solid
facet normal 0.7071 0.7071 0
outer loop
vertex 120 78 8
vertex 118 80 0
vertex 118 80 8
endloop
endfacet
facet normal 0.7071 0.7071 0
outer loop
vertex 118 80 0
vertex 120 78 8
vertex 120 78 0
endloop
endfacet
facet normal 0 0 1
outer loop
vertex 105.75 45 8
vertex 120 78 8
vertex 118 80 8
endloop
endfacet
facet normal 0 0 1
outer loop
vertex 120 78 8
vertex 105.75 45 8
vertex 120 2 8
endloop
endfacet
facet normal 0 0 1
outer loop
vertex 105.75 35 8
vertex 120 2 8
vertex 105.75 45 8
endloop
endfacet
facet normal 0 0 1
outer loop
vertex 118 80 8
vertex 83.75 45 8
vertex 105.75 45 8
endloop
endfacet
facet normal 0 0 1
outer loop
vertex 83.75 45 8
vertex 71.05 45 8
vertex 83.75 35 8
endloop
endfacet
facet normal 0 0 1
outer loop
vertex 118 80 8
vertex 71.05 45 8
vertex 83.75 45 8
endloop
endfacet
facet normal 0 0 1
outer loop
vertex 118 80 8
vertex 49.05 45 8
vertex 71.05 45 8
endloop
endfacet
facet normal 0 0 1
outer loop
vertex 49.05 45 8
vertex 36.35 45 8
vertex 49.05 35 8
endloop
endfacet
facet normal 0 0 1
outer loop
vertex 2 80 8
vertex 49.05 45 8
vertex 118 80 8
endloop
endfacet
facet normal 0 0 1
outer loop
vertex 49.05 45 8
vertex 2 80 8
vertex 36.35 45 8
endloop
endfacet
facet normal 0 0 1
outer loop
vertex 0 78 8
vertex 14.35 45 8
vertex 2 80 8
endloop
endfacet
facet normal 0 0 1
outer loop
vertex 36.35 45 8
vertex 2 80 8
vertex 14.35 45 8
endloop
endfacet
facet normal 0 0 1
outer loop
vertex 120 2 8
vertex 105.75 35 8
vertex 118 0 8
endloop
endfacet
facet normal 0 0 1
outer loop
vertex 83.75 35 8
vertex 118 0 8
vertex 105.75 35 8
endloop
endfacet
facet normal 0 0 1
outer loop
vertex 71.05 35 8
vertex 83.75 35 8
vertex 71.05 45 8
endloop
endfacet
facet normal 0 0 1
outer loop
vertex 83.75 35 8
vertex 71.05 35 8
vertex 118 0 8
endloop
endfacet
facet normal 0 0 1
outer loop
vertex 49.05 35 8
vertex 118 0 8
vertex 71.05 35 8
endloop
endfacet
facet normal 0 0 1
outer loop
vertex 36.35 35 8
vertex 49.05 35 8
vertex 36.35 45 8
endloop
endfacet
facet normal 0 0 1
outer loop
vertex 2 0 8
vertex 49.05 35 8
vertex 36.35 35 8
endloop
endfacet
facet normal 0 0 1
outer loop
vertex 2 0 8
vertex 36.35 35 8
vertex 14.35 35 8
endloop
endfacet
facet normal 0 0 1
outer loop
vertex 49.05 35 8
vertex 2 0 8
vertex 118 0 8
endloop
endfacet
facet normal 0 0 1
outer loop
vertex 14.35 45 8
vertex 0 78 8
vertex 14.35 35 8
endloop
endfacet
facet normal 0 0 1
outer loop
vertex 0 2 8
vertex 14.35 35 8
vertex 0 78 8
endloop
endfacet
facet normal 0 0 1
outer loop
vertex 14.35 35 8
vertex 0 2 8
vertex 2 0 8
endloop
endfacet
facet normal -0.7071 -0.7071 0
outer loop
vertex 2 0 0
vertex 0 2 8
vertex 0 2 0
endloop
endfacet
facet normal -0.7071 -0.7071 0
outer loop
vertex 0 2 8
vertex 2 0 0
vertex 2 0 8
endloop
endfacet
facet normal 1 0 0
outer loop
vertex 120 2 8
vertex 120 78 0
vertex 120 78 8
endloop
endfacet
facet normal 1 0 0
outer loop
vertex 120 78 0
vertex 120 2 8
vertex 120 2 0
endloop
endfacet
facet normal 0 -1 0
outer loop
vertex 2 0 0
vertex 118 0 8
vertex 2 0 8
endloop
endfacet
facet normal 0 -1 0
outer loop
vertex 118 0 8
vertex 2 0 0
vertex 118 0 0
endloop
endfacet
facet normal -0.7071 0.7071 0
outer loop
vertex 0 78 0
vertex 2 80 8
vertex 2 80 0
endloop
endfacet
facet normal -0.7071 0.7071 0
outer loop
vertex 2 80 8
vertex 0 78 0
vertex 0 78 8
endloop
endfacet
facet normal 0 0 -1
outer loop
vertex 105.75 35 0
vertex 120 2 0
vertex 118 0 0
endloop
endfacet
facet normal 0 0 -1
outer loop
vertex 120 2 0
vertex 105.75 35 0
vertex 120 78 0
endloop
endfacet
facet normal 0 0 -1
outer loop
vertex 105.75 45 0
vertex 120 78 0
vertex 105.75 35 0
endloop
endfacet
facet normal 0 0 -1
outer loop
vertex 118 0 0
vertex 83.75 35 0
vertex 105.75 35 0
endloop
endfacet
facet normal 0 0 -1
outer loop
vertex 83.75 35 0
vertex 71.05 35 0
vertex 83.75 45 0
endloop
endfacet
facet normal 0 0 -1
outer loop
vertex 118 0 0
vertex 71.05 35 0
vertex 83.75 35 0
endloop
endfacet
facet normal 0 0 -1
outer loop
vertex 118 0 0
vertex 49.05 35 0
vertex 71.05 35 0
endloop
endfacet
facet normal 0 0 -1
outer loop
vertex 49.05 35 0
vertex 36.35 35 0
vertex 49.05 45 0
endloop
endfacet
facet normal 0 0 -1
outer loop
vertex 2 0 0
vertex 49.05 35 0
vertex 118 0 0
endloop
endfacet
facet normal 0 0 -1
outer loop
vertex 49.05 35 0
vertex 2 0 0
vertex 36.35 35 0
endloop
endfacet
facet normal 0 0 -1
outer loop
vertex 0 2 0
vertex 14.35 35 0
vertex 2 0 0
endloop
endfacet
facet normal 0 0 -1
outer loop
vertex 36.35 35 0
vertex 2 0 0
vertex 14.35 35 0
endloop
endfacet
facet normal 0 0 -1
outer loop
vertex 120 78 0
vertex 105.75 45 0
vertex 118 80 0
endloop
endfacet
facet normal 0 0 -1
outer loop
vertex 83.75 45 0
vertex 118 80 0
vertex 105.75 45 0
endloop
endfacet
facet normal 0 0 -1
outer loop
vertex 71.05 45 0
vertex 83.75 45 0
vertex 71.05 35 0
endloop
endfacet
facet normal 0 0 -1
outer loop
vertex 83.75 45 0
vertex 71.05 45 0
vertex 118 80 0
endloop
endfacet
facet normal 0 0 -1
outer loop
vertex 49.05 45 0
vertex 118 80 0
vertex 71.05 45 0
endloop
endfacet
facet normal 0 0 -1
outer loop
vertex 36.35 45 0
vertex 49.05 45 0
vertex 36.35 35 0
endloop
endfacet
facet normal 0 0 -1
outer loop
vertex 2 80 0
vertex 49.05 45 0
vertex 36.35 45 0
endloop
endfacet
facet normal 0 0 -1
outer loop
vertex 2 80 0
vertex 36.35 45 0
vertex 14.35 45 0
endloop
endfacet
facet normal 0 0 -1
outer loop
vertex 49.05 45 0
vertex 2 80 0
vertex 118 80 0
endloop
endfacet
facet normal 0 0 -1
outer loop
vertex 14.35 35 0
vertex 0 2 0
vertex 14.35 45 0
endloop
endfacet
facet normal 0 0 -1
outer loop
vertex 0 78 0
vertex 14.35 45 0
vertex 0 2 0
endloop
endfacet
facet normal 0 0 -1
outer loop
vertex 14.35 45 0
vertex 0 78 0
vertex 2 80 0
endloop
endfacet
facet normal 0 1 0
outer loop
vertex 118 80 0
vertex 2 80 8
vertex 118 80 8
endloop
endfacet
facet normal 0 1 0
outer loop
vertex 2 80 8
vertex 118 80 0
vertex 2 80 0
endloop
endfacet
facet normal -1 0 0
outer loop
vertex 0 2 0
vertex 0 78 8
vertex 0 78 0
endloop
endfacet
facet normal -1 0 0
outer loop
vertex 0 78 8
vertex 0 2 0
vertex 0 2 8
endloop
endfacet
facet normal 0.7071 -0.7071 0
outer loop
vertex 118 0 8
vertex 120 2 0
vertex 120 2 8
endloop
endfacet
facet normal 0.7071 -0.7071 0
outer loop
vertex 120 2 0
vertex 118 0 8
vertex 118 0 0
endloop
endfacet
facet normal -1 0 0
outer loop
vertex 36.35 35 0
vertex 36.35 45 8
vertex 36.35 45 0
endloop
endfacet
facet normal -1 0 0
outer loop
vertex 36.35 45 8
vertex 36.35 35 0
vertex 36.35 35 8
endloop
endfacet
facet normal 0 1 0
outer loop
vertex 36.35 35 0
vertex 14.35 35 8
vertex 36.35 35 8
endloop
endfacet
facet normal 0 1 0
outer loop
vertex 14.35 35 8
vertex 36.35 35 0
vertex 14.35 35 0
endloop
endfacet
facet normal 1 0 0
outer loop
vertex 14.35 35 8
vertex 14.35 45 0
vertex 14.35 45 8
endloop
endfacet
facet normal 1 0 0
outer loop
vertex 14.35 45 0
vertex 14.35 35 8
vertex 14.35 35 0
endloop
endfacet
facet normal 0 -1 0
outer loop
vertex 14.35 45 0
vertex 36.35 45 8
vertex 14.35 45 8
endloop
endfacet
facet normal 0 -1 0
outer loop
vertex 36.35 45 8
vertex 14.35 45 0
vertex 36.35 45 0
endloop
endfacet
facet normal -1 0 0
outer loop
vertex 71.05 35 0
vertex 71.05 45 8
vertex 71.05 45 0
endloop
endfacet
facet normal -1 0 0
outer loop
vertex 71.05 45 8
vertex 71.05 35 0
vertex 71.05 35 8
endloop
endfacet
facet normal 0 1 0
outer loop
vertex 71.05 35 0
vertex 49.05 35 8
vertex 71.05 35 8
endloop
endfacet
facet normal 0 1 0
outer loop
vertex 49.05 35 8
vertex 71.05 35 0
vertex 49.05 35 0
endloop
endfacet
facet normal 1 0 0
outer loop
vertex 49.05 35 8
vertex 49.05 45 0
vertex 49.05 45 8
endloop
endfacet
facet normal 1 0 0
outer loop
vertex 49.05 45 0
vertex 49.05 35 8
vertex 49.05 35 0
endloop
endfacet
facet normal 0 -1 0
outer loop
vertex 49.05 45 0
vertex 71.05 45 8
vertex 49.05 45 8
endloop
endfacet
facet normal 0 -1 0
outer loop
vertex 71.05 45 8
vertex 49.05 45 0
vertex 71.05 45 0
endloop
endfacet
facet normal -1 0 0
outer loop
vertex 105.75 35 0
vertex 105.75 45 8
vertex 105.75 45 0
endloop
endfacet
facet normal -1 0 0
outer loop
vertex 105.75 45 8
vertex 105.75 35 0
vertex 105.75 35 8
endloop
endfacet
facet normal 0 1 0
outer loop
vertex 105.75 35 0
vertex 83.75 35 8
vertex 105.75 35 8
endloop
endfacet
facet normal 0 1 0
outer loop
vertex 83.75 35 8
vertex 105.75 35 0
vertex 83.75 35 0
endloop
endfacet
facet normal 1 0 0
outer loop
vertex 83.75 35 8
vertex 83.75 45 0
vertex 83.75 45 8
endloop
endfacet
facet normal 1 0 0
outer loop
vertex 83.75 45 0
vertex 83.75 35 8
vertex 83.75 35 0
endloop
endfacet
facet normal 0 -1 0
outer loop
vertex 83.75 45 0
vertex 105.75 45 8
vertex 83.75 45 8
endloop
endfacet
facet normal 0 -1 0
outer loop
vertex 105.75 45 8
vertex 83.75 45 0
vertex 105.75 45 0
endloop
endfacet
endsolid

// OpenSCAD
$fn = 32;

// ----------------------------------------------------------------------
// Windowed plate: 3 voids, 120 x 80 x 8 mm
// ----------------------------------------------------------------------

// --- parameters (mm) ---
plate_l = 120;            // plate length, X
plate_w = 80;             // plate width, Y
plate_t = 8;              // plate thickness, Z
edge_margin = 8;          // wall from the plate edge to any window
windows = 3;              // number of windows in the row
win_l = 22;               // window length
win_w = 10;               // window width
win_pitch = 34.7;         // window pitch along X
depth_1 = 8;              // depth of void 1 (full thickness = through)
depth_2 = 8;              // depth of void 2 (full thickness = through)
depth_3 = 8;              // depth of void 3 (full thickness = through)
corner_c = 2;             // corner chamfer of the plate

profile = [[2, 0], [118, 0], [120, 2], [120, 78], [118, 80], [2, 80], [0, 78], [0, 2]];  // primary outline, 8 points, counter clockwise
void_1 = [[14.35, 35], [36.35, 35], [36.35, 45], [14.35, 45]];  // window 1 of the row, 4 points
void_2 = [[49.05, 35], [71.05, 35], [71.05, 45], [49.05, 45]];  // window 2 of the row, 4 points
void_3 = [[83.75, 35], [105.75, 35], [105.75, 45], [83.75, 45]];  // window 3 of the row, 4 points

// --- the one profile operation ---
difference() {
  linear_extrude(height = plate_t) polygon(points = profile);
  translate([0, 0, -1])
    linear_extrude(height = plate_t + 2) polygon(points = void_1);
  translate([0, 0, -1])
    linear_extrude(height = plate_t + 2) polygon(points = void_2);
  translate([0, 0, -1])
    linear_extrude(height = plate_t + 2) polygon(points = void_3);
}
